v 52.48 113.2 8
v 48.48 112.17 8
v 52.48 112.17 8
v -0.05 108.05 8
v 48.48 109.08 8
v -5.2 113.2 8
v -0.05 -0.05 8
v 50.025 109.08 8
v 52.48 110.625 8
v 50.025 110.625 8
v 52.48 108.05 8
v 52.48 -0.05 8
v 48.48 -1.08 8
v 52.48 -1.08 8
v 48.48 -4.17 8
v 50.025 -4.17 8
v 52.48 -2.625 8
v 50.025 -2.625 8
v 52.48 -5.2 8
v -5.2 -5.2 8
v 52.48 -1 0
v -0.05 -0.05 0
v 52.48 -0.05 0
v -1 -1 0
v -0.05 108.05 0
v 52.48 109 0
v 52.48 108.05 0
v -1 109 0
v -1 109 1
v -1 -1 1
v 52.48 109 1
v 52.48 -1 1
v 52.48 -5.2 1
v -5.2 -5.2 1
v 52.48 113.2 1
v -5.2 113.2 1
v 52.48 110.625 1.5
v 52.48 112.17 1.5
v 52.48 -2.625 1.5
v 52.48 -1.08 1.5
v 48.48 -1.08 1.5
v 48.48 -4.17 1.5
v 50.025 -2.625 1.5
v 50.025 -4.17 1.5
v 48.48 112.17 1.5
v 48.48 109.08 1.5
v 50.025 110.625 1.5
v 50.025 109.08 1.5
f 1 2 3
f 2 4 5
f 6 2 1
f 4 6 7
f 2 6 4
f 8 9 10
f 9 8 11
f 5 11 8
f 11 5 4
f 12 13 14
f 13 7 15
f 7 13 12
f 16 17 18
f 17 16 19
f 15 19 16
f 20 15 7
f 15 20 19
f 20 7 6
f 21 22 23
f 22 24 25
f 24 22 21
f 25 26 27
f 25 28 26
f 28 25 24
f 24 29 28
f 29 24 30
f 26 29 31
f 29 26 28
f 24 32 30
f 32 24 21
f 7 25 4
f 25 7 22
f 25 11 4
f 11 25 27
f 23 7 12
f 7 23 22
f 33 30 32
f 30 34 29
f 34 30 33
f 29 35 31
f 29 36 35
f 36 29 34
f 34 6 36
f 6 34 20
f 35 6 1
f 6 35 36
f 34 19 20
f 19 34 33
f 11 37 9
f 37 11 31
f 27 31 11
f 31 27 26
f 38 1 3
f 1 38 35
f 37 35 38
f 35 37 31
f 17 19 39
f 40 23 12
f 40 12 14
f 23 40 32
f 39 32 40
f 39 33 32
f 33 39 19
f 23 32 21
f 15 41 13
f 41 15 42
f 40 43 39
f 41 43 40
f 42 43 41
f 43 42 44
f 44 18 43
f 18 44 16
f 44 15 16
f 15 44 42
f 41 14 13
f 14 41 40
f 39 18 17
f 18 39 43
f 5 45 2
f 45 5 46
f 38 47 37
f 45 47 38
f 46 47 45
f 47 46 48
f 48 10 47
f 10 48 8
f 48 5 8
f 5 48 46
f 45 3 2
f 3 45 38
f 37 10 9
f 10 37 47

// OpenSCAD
// Generated by SolidPython 1.0.4 on 2021-01-27 23:57:27


difference() {
	difference() {
		difference() {
			union() {
				difference() {
					translate(v = [-1.0000000000, -1.0000000000, 0]) {
						cube(size = [74.0000000000, 110.0000000000, 8]);
					}
					translate(v = [-0.0500000000, -0.0500000000, 0]) {
						cube(size = [72.1000000000, 108.1000000000, 8]);
					}
				}
				translate(v = [0, 0, 1]) {
					difference() {
						translate(v = [-5.2000000000, -5.2000000000, 0]) {
							cube(size = [82.4000000000, 118.4000000000, 7]);
						}
						translate(v = [-1.0000000000, -1.0000000000, 0]) {
							cube(size = [74.0000000000, 110.0000000000, 7]);
						}
					}
				}
			}
			translate(v = [52.4800000000, -5.2000000000, 0]) {
				cube(size = [24.7200000000, 118.4000000000, 8]);
			}
		}
		translate(v = [48.4800000000, -4.1700000000, 0]) {
			translate(v = [0, 0, 1.5000000000]) {
				translate(v = [4, 3.0900000000, 0]) {
					rotate(a = -180) {
						union() {
							translate(v = [2.4550000000, 0, 0]) {
								cube(size = [1.5450000000, 3.0900000000, 6.5000000000]);
							}
							cube(size = [4, 1.5450000000, 6.5000000000]);
						}
					}
				}
			}
		}
	}
	translate(v = [48.4800000000, 109.0800000000, 0]) {
		translate(v = [0, 0, 1.5000000000]) {
			translate(v = [4, 3.0900000000, 0]) {
				rotate(a = -180) {
					union() {
						translate(v = [2.4550000000, 0, 0]) {
							cube(size = [1.5450000000, 3.0900000000, 6.5000000000]);
						}
						cube(size = [4, 1.5450000000, 6.5000000000]);
					}
				}
			}
		}
	}
}
